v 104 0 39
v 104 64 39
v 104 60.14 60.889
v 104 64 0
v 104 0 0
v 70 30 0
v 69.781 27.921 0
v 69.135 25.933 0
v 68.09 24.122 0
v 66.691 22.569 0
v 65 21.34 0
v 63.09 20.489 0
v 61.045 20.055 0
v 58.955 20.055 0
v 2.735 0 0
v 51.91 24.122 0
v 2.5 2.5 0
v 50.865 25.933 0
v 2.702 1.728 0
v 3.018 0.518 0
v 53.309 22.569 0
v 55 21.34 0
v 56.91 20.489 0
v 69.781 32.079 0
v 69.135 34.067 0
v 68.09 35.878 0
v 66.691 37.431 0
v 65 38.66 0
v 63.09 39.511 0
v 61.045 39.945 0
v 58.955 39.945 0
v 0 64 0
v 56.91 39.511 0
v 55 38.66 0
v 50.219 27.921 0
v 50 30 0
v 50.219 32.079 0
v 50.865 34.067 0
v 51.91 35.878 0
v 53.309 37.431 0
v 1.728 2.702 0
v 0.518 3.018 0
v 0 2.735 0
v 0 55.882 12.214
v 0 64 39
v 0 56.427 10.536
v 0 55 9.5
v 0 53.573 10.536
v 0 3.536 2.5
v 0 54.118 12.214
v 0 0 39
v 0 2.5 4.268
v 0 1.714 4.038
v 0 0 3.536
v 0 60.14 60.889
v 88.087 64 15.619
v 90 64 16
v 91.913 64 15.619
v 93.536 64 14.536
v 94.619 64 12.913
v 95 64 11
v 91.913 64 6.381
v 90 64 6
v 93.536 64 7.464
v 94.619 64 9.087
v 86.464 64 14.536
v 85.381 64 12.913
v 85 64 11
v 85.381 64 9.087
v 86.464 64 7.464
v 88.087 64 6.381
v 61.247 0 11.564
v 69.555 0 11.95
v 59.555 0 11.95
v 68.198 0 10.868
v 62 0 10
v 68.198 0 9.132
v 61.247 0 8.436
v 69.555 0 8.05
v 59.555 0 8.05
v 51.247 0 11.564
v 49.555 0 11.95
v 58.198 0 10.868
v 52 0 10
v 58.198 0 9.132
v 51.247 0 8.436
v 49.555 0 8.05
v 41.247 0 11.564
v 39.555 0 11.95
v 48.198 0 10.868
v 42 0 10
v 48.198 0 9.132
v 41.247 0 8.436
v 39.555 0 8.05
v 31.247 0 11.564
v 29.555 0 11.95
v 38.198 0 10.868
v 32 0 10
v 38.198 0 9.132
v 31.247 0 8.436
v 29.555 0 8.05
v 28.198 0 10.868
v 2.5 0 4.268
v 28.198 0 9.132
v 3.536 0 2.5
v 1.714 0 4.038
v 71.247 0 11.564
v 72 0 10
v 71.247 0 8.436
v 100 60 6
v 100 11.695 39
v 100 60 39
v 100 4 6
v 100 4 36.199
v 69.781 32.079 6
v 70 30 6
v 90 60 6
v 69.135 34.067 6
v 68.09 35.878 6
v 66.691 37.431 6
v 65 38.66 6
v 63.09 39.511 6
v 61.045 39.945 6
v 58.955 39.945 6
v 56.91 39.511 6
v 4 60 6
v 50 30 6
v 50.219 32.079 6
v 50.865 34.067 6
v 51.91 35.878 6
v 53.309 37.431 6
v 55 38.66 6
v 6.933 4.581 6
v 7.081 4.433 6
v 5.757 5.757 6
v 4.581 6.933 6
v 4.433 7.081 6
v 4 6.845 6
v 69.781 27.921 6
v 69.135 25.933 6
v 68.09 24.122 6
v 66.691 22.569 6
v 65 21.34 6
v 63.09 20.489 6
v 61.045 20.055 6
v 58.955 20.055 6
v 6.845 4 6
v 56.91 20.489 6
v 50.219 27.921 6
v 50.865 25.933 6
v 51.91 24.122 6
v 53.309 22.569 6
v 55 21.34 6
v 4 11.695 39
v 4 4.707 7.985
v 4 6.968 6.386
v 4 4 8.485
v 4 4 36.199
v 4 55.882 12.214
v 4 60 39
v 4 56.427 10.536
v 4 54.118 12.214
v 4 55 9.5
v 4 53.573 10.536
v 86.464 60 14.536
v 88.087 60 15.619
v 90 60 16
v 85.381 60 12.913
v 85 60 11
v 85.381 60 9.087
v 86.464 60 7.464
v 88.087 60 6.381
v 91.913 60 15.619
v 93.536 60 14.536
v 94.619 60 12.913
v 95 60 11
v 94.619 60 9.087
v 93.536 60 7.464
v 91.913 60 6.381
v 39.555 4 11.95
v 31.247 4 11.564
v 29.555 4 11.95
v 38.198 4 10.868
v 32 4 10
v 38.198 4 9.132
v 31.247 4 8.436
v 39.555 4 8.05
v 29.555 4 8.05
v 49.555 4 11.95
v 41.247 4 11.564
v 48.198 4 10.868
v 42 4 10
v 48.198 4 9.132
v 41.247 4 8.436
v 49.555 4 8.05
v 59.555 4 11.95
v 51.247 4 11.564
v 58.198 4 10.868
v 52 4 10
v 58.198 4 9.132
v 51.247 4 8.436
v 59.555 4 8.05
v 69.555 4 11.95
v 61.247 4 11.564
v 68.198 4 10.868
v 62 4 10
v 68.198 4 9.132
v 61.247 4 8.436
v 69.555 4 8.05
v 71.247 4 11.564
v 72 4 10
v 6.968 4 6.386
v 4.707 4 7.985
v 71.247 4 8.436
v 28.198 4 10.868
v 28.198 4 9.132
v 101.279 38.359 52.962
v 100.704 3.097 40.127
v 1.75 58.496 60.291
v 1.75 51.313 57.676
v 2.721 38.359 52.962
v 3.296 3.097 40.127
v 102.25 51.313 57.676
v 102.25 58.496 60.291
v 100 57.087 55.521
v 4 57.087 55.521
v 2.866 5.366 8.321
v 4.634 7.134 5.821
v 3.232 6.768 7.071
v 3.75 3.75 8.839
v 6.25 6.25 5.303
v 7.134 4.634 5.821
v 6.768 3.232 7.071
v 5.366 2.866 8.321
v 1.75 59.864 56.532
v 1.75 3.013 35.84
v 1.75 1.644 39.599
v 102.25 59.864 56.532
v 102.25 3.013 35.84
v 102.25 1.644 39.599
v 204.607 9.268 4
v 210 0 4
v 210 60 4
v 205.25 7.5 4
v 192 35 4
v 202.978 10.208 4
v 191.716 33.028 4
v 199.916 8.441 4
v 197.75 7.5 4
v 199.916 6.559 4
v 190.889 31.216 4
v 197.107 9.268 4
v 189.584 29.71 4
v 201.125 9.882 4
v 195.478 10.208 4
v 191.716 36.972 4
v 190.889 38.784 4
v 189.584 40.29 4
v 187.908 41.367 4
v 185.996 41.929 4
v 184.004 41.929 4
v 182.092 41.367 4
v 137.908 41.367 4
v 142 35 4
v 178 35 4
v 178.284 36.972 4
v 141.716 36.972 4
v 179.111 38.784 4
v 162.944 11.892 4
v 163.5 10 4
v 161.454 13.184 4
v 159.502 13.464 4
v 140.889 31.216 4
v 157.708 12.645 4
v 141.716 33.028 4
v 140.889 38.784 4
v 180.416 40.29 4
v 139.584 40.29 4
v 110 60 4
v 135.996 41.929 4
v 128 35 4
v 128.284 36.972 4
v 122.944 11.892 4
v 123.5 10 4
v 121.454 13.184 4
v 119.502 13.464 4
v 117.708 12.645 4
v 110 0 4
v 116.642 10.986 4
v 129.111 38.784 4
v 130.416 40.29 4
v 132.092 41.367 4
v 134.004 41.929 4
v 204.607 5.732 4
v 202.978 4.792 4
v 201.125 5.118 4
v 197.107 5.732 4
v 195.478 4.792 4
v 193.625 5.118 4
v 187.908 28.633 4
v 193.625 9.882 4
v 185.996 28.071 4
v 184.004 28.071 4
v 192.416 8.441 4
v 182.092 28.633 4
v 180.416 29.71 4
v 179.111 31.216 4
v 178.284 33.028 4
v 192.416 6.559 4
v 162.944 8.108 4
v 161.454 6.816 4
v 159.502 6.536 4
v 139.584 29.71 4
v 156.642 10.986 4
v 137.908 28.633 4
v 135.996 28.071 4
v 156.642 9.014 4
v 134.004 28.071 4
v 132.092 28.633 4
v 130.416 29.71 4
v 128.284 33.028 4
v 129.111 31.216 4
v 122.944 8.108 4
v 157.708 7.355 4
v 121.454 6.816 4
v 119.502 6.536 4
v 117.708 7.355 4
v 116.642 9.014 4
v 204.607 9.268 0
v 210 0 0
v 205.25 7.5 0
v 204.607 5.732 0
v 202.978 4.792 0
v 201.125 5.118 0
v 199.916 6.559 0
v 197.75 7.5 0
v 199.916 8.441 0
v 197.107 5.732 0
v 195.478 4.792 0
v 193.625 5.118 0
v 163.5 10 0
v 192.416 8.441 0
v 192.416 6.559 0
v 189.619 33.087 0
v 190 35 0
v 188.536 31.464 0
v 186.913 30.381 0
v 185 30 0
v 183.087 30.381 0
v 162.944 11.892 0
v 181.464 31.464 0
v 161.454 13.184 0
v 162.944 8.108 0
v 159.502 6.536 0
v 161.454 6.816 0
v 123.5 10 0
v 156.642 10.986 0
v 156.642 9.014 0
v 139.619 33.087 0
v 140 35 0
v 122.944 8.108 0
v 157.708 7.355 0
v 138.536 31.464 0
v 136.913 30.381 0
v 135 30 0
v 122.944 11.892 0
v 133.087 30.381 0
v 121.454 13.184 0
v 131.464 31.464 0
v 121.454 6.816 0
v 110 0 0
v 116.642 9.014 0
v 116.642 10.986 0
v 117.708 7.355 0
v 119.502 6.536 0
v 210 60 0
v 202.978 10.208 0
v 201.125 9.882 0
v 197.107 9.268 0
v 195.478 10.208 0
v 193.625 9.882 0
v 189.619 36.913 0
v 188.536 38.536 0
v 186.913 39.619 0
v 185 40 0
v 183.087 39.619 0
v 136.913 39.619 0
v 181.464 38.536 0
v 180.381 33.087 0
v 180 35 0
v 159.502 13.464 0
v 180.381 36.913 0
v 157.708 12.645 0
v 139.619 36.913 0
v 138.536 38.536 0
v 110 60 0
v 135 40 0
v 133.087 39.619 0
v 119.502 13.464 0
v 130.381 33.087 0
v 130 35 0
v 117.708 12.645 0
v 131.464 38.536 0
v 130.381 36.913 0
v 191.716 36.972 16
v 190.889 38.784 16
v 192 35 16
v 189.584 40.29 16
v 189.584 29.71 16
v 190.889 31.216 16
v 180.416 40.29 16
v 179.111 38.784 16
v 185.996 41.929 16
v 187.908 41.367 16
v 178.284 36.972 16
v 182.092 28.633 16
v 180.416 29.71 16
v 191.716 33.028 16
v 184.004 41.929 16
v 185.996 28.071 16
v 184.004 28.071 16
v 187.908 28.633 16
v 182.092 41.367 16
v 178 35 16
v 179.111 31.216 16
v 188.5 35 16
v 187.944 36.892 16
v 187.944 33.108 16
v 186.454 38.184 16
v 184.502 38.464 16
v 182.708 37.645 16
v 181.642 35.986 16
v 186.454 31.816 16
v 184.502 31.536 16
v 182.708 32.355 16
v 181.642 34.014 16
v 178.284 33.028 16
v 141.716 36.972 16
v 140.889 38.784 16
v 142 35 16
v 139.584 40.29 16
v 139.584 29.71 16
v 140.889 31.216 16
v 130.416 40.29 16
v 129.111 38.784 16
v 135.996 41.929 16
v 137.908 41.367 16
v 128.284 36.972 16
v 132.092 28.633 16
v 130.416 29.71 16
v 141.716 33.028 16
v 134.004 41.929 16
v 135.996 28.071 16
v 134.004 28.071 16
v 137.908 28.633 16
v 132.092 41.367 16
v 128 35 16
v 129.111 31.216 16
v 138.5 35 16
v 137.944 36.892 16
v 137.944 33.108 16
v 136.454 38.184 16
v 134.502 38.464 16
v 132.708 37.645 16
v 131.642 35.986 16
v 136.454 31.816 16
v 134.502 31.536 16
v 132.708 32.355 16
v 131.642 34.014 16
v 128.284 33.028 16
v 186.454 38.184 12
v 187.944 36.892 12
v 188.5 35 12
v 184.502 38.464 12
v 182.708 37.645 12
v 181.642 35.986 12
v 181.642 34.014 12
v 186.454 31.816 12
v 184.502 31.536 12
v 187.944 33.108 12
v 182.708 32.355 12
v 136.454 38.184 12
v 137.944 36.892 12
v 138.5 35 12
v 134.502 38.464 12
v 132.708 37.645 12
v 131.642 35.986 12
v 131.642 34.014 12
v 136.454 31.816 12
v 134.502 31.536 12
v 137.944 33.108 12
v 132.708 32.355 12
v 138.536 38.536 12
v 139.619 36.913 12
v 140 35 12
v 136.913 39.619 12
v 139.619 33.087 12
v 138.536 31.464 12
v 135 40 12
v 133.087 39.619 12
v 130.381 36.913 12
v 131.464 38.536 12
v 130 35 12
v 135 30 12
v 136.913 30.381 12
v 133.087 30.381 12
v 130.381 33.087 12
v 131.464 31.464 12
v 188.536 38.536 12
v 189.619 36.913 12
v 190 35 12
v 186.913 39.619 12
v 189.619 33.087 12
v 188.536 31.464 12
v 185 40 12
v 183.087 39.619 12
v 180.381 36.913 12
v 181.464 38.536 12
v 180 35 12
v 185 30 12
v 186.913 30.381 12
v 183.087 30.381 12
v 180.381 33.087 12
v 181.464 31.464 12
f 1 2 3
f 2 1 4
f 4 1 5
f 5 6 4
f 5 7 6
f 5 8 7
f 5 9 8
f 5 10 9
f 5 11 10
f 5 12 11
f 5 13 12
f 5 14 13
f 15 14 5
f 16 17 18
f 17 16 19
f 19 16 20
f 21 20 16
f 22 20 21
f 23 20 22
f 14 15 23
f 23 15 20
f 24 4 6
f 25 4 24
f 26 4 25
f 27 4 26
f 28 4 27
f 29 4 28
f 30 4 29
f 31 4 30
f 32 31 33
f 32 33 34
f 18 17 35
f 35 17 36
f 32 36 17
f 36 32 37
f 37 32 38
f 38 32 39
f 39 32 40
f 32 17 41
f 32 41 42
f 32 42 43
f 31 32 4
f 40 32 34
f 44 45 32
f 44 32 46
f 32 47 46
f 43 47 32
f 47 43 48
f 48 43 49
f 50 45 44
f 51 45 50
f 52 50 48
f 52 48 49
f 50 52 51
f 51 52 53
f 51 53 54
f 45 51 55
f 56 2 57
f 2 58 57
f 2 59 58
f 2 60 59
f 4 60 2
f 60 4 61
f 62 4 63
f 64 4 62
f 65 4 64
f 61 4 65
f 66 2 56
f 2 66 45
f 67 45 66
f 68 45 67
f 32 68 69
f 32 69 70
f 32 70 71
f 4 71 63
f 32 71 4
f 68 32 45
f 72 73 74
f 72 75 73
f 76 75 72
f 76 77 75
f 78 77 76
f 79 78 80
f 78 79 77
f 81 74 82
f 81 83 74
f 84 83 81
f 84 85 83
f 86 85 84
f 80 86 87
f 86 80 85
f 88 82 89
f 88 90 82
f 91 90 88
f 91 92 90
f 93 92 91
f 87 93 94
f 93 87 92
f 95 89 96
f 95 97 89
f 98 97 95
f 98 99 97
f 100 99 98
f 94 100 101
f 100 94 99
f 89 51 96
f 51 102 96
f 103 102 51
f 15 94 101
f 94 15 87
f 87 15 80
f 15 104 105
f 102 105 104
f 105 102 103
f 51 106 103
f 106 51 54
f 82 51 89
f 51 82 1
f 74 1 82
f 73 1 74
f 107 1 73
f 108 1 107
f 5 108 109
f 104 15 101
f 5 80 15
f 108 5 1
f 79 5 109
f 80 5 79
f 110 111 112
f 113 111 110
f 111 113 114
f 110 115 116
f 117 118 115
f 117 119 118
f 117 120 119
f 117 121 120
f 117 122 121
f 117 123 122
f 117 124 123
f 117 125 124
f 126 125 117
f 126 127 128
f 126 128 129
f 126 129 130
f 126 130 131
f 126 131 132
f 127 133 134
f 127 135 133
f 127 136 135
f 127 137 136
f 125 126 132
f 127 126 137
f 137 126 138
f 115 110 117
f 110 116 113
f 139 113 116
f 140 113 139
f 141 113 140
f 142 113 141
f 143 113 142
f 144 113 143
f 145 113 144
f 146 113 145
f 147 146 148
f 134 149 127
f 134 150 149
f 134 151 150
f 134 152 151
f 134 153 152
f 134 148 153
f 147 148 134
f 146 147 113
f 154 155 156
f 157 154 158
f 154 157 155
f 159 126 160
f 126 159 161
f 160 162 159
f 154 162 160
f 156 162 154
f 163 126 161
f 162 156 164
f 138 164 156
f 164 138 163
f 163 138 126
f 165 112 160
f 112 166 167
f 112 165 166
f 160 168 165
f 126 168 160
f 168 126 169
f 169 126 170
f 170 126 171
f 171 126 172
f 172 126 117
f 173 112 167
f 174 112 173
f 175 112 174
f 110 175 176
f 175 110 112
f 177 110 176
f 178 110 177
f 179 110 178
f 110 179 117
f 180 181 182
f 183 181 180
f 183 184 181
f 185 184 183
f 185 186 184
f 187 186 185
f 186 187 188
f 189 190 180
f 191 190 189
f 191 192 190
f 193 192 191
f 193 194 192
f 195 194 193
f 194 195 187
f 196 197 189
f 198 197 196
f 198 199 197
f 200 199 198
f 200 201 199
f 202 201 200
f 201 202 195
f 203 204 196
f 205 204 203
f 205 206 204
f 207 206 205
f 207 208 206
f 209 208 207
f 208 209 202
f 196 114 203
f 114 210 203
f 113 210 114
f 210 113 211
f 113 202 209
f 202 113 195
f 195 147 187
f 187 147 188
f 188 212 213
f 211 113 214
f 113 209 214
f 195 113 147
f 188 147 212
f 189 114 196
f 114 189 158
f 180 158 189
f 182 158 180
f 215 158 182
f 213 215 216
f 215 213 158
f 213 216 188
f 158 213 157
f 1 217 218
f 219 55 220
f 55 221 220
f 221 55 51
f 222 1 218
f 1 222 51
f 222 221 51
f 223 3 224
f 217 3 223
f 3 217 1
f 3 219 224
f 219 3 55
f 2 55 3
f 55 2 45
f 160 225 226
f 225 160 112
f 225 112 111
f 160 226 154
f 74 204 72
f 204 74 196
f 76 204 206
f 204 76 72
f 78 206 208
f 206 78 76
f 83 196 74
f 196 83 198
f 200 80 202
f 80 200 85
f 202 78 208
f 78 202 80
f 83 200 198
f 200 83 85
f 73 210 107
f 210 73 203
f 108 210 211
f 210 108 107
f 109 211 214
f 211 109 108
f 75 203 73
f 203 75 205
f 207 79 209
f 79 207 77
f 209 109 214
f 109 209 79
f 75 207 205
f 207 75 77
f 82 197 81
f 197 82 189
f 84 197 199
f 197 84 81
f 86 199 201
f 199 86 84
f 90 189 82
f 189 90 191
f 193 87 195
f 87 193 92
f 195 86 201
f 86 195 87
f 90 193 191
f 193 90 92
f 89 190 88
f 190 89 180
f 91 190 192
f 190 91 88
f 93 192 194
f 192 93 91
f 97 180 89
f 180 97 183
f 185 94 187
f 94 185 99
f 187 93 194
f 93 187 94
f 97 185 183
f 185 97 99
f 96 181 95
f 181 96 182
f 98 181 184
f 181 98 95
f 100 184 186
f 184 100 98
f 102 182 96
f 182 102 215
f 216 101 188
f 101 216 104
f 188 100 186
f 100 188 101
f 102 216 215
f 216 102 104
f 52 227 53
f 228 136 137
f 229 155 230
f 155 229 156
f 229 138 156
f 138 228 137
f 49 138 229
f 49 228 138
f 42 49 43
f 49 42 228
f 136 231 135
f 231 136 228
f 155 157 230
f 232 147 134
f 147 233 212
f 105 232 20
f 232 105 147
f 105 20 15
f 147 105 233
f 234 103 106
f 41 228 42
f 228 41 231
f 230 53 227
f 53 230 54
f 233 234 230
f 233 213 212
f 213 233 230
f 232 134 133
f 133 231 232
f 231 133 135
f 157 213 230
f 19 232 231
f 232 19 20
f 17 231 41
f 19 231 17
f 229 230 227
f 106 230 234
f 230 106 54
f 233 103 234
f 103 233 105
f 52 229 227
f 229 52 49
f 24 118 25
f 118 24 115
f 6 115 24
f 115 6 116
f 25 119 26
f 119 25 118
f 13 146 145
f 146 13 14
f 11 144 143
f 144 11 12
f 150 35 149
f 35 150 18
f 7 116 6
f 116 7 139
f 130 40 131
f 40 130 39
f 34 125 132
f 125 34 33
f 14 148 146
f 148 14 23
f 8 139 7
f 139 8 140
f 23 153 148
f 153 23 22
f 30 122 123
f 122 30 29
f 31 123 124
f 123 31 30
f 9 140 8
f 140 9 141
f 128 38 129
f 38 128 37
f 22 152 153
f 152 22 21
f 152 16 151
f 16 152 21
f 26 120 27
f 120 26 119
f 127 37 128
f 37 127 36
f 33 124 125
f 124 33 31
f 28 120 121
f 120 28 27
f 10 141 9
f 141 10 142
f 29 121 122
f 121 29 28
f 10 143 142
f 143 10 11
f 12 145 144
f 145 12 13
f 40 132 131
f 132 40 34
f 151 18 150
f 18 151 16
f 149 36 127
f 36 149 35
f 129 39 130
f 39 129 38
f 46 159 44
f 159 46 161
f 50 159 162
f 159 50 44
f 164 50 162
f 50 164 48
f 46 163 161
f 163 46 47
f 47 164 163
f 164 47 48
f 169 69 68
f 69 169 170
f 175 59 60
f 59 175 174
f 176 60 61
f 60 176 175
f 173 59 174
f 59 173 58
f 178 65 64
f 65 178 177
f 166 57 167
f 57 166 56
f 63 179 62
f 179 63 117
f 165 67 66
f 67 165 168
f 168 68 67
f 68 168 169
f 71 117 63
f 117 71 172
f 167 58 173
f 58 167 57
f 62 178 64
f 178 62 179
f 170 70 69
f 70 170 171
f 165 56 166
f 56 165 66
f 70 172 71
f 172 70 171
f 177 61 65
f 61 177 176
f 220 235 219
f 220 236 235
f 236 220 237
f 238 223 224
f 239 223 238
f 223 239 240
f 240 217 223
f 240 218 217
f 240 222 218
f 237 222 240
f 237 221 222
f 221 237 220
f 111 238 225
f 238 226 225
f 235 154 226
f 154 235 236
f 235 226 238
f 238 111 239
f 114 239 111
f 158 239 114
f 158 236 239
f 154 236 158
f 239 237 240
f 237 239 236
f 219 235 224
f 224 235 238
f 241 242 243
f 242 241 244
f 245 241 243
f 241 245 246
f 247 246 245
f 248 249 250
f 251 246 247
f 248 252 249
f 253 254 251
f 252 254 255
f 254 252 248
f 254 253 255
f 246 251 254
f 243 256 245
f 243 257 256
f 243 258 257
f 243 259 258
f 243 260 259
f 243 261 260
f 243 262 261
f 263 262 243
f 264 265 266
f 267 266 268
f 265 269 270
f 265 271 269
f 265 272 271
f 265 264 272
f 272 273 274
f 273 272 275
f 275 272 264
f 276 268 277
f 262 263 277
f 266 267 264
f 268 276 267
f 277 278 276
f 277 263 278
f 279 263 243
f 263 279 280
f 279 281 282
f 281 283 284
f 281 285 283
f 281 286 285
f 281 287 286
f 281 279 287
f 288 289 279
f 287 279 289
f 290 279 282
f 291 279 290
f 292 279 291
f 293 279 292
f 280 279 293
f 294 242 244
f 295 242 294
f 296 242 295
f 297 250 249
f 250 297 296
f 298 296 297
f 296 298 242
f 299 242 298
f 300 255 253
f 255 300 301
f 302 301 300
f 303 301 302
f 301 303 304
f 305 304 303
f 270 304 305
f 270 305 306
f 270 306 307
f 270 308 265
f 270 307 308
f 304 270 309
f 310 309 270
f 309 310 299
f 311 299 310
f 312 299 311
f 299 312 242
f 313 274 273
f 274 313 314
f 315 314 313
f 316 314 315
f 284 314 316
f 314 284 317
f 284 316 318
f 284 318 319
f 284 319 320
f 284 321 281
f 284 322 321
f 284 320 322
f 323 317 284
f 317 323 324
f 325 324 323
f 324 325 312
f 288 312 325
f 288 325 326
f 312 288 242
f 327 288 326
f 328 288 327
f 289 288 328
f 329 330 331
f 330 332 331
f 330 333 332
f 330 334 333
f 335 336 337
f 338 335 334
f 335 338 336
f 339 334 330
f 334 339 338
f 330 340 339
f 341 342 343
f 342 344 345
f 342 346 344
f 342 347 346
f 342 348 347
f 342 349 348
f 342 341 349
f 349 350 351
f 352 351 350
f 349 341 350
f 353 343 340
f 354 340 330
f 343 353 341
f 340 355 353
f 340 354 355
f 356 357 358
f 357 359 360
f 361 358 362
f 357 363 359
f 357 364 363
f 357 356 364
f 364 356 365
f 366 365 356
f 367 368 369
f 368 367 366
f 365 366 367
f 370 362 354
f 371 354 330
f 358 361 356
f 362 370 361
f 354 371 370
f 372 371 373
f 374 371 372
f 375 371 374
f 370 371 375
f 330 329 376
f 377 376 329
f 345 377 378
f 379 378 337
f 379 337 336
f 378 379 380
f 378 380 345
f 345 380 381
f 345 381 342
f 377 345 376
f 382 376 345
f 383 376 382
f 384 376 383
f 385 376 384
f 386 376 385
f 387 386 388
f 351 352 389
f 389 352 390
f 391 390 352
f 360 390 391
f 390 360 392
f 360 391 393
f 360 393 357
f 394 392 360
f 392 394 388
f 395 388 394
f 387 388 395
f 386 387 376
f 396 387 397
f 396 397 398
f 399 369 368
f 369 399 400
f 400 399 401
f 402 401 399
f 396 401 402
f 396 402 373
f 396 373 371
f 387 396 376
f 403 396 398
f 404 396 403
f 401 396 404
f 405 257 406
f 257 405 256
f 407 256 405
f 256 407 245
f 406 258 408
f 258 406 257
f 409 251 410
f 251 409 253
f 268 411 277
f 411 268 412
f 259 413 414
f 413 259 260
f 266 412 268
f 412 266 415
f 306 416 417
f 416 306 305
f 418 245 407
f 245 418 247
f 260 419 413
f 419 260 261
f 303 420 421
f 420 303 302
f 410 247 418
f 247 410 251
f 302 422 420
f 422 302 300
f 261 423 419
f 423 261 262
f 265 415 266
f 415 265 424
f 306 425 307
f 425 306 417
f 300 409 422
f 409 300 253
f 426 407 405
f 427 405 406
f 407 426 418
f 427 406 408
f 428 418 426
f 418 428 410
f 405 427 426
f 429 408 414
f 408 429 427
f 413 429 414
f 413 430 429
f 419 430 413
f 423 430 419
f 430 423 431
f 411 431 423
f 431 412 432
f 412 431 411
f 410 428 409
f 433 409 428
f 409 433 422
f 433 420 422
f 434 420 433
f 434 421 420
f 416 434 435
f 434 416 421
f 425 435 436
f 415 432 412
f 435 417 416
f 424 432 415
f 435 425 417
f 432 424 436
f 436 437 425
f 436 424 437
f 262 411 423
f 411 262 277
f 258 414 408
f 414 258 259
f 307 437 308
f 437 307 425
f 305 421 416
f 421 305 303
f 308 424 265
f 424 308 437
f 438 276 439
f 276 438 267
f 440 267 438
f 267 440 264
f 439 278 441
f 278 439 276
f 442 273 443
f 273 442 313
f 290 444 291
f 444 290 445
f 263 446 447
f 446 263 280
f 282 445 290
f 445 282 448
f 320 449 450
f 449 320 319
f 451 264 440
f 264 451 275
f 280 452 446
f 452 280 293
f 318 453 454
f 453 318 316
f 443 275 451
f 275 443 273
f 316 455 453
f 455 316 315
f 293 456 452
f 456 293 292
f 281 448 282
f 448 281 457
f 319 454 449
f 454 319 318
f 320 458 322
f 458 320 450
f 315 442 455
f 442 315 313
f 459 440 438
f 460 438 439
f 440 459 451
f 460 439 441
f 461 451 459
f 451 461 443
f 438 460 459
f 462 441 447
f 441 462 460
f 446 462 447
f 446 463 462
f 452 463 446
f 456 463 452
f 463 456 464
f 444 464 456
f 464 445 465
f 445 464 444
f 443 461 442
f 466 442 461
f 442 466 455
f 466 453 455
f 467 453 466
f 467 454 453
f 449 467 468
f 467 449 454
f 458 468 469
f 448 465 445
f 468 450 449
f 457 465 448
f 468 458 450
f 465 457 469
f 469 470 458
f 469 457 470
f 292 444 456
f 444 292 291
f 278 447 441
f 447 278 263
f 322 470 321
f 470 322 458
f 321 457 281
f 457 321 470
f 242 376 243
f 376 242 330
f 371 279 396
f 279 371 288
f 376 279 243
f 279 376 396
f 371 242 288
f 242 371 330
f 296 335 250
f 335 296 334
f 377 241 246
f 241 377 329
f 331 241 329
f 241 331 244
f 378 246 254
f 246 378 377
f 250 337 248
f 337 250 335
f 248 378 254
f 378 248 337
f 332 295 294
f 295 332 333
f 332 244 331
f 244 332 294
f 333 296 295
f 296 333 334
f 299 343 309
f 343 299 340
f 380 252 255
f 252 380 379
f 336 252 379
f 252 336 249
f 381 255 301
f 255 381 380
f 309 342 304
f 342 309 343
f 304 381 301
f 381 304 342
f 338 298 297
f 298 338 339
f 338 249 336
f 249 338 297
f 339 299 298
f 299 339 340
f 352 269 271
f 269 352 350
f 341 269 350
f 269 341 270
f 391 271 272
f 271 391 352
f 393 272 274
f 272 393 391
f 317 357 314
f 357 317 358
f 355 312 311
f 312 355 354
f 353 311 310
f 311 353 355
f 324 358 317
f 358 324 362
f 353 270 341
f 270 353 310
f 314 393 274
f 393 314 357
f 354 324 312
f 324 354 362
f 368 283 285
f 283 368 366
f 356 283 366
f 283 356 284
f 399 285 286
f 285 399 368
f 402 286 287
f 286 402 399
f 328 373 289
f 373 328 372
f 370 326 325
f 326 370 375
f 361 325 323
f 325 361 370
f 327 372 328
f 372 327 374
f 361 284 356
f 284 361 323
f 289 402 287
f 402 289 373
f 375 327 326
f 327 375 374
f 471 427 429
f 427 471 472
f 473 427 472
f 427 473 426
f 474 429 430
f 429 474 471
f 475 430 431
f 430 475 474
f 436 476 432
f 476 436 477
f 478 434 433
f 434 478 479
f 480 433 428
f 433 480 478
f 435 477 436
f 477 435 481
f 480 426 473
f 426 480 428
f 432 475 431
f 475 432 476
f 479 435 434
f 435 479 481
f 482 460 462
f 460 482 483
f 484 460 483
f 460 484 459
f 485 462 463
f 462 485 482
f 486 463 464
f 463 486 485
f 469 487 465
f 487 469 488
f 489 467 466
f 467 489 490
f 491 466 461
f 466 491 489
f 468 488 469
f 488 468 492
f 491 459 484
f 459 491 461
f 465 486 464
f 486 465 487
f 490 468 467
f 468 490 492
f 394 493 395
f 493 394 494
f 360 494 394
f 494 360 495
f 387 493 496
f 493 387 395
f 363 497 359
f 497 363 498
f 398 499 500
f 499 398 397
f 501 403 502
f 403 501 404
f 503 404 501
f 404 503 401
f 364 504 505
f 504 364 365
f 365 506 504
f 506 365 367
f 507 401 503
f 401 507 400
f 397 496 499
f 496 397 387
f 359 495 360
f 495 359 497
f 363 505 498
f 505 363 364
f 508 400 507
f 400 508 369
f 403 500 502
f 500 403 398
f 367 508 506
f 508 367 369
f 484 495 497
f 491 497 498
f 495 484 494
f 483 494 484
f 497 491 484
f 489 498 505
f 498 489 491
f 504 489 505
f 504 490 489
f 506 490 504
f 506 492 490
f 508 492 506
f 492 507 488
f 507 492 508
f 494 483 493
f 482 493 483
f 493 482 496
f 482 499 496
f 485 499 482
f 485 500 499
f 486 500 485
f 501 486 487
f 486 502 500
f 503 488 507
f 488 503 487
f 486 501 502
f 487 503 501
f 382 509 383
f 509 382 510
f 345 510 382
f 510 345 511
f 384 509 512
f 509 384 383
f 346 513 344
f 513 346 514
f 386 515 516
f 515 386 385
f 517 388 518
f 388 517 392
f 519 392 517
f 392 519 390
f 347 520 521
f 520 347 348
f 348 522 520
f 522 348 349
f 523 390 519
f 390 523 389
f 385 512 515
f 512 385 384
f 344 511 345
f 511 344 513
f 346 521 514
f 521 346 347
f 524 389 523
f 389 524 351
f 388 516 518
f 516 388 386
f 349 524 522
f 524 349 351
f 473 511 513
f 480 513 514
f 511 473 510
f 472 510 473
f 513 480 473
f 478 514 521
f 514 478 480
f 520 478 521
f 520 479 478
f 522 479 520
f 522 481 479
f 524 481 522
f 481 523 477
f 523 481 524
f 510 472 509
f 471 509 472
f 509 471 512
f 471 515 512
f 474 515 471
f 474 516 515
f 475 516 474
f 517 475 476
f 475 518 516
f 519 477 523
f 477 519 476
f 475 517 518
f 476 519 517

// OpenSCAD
// file: ../templates/caseTemplate.scad
// predefine Cut rotations          
R = [[90,00,00], [00,90,00],[00,00,00]];
X = 0;
Y = 1;
Z = 2;


//translate([120,0,0]){
//    Panel(componentPlacement, panel);
//}




//this is a case for a panel 
//Case([65,65,4], 60);


module Case(topPanel, internalCaseDepth, tiltControl=0, cuts=[]){
    COORDINATES=0;
    ROTATION=1;
    DIAMETER=2;

    thiknes = topPanel[Z];
    difference(){
        translate([(topPanel[X]+thiknes)/2, (topPanel[Y]+thiknes)/2,(internalCaseDepth+thiknes)/2]){
            group(){
                difference(){
                    //create main box
                    cube([topPanel[X]+thiknes, topPanel[Y]+thiknes, internalCaseDepth+thiknes], true);
                    
                    //create void inside
                    translate([0, 0, thiknes]){
                        cube([topPanel[X]-thiknes, topPanel[Y]-thiknes, internalCaseDepth], true);
                    }
                }
                //add the tilted part of the control panel if needed.
                tiltControls(topPanel,internalCaseDepth, tiltControl);
            }
        }
        //make cutout for the lid
        lid(topPanel, internalCaseDepth, tiltControl);
        // cut holes for wires or air...
        cut(cuts);
    }
    
    //Recursive call over the cuts in the box
    module cut(cuts, h=thiknes*5, i=0) {
        if(i < len(cuts)) {
            cut = cuts[i];
            translate(cut[COORDINATES]) {
                rotate(cut[ROTATION]) {
                    cylinder(h=h, d=cut[DIAMETER], center=true);
                }
            }
            cut(cuts, h, i+1);   
        }
    }
    
    module tiltControls(topPanel,internalCaseDepth, tiltControl){
        thiknes = topPanel[Z];
            translate([-(topPanel[X]+thiknes)/2,-(topPanel[Y]+thiknes)/2,(internalCaseDepth+thiknes)/2]){
                
                rotate([90,0,90]){
            
                    rotate_extrude(angle=tiltControl){
                        difference(){
                            square([topPanel[Y]+thiknes,topPanel[X]+thiknes]);
                            translate([thiknes,thiknes,0]){
                                square([topPanel[Y]-thiknes,topPanel[X]-thiknes]); //cutout
                            }
                        }
                    }
                }
            }
    }

    module lid(topPanel, internalCaseDepth, angle, tolerence=0.5){
        thiknes = topPanel[Z];
        translate([thiknes/2,0,internalCaseDepth+thiknes])
        rotate([angle,0,0])
        translate([(topPanel[X])/2,(topPanel[Y]+thiknes)/2,-thiknes/2])
        cube([topPanel[X]+tolerence,topPanel[Y]+tolerence,thiknes], true);
    }
}
// file: ../templates/controlPanelTemplate.scad
/**
This file helps create control a control panel
placing components you might want, taking into account 
that some components require a thiker panel than others
and some needs to be sunken into the panel 

// below you can see an example of a panel specification.
but you can create your own in 4 steps
1. define a Panel
2. define some components
3. place components on panel 
4. call Panel()


**/
// =========  this should be constants ========
X = 0;
Y = 1;
Z = 2;
COMPONENT = 2;
NAME = 3;
LIP_HEIGHT = 0;
BORE_DIA = 1;
SUNKEN_DIA = 2;
SUNKEN_DEAPTH =3;

/**

// panel[  X, Y,Z]
panel = [100,60,4];

// components
// [LIP_HEIGHT, BORE_DIA, SUNKEN_DIA, SUNKEN_DEAPTH]
jogWheel = [16,        7,         10, 12];
switch   = [ 0,        7,          0,  0];
led      = [ 0,      5.5,          0,  0];


//        [X                    ,Y            , COMPONENT, NAME]
componentPlacement = [
          [panel[0]/4           , panel[1]/2+5, jogWheel, "jog 1"],
          [panel[0] - panel[0]/4, panel[1]/2+5, jogWheel, "jog 2"],
          [10                   , 10          , switch  , "on/off"],
          [panel[0]/2           , 10          , switch  , "fire button"],
          [panel[0]-7.5         , 7.5         , led     , "power led"],
          [panel[0]-15          , 7.5         , led     , "data led"],
          ];


Panel(componentPlacement, panel);

**/

module Panel(componentPlacement, panelDim){
    difference(){
        group(){
            cube(panelDim);
            createLip(componentPlacement, panelDim, lipWith=panelDim[Z]);
        }
        drill(componentPlacement, panelDim);
        sunken(componentPlacement);
    }
    
    module drill(componentPlacement, panelDim, i=0, buffer=1){
        if(i < len(componentPlacement)){
            cp = componentPlacement[i];
            translate([cp[X], cp[Y], 0-buffer/2]){
                cylinder(
                    h = max(cp[COMPONENT][LIP_HEIGHT], panelDim[Z]) + buffer, 
                    d = cp[COMPONENT][BORE_DIA]);
            }
            drill(componentPlacement, panelDim, i+1, buffer);
        }
     }
     
     module createLip(componentPlacement, panelDim, i=0, lipWith=0){
        if(i < len(componentPlacement)){
            cp = componentPlacement[i];
            dia = max(cp[COMPONENT][SUNKEN_DIA], cp[COMPONENT][BORE_DIA]);
            assert(validate(cp, lipWith, dia/2, panelDim), str(cp[NAME], " out of bounds."));

            translate([cp[X], cp[Y], 0]){
                cylinder(
                    h = max(cp[COMPONENT][LIP_HEIGHT], panelDim[Z]), 
                    d = dia + lipWith
                );
            }
            createLip(componentPlacement, panelDim, i+1, lipWith);
        }
    }

    module sunken(componentPlacement, i=0, buffer=1){
        if(i < len(componentPlacement)){
            cp = componentPlacement[i];
            translate([cp[X], cp[Y],0-buffer]){
                cylinder(
                    h=cp[COMPONENT][SUNKEN_DEAPTH] + buffer, 
                    d=cp[COMPONENT][SUNKEN_DIA]
                );
            }
            sunken(componentPlacement, i+1, buffer);
        }
    }
    
    function max(a, b) = a > b ? a : b;
    function min(a, b) = a > b ? a : b;

    function validate(cp, lipWith, r, panelDim) = ((cp[X] + lipWith + r < panelDim[X]) &&
                                            (cp[X] - lipWith - r > 0) &&
                                            (cp[Y] + lipWith + r < panelDim[Y]) &&
                                            (cp[Y] - lipWith - r > 0)
                                            );

}
// main file
include <../templates/controlPanelTemplate.scad>
include <../templates/caseTemplate.scad>


// ======= DEFINE CASE =======

// panel[ X, Y,Z]
// thiknes of case is the same as panel[Z]
// final size of case is X+Z, Y+Z
panel = [100,60,4];

// room inside the case
caseZ = 35;

// Define cuts in case 
cuts = [[[90, 60, 11] ,R[X], 10], // 10 mm back right
        [[0 , 55, 11] ,R[Y], 3],  //  3 mm hole left side
        [[60, 30,  2] ,R[Z], 20], // 20 mm hole in the bottom
        [[0 ,  0,  0] ,[-45,0,-45], 5], // 5 mm Diagonal thru the corner
        [[30,  0, 10] ,R[X], 4],
        [[40,  0, 10] ,R[X], 4],
        [[50,  0, 10] ,R[X], 4],
        [[60,  0, 10] ,R[X], 4],
        [[70,  0, 10] ,R[X], 4],
        ]; 

// Define angle of panel on case
angel = 20;
// ======= Build Case =======

Case(panel, caseZ, angel, cuts=cuts);


// ======= DEFINE COMPONENTS ON PANEL =======

// [LIP_HEIGHT, BORE_DIA, SUNKEN_DIA, SUNKEN_DEAPTH]
jogWheel = [16,        7,         10, 12];
switch   = [ 0,        7,          0,  0];
led      = [ 0,      5.5,          0,  0];


// make placements  [X  ,Y , COMPONENT, NAME]
componentPlacement = [
          [panel[0]/4           , panel[1]/2+5, jogWheel, "jog 1"],
          [panel[0] - panel[0]/4, panel[1]/2+5, jogWheel, "jog 2"],
          [10                   , 10          , switch  , "on/off"],
          [panel[0]/2           , 10          , switch  , "fire button"],
          [panel[0]-7.5         , 7.5         , led     , "power led"],
          [panel[0]-15          , 7.5         , led     , "data led"],
          ];

// ======= Build panel out of the way =======

translate([panel[X]+10,0]){
    Panel(componentPlacement, panel);
}
